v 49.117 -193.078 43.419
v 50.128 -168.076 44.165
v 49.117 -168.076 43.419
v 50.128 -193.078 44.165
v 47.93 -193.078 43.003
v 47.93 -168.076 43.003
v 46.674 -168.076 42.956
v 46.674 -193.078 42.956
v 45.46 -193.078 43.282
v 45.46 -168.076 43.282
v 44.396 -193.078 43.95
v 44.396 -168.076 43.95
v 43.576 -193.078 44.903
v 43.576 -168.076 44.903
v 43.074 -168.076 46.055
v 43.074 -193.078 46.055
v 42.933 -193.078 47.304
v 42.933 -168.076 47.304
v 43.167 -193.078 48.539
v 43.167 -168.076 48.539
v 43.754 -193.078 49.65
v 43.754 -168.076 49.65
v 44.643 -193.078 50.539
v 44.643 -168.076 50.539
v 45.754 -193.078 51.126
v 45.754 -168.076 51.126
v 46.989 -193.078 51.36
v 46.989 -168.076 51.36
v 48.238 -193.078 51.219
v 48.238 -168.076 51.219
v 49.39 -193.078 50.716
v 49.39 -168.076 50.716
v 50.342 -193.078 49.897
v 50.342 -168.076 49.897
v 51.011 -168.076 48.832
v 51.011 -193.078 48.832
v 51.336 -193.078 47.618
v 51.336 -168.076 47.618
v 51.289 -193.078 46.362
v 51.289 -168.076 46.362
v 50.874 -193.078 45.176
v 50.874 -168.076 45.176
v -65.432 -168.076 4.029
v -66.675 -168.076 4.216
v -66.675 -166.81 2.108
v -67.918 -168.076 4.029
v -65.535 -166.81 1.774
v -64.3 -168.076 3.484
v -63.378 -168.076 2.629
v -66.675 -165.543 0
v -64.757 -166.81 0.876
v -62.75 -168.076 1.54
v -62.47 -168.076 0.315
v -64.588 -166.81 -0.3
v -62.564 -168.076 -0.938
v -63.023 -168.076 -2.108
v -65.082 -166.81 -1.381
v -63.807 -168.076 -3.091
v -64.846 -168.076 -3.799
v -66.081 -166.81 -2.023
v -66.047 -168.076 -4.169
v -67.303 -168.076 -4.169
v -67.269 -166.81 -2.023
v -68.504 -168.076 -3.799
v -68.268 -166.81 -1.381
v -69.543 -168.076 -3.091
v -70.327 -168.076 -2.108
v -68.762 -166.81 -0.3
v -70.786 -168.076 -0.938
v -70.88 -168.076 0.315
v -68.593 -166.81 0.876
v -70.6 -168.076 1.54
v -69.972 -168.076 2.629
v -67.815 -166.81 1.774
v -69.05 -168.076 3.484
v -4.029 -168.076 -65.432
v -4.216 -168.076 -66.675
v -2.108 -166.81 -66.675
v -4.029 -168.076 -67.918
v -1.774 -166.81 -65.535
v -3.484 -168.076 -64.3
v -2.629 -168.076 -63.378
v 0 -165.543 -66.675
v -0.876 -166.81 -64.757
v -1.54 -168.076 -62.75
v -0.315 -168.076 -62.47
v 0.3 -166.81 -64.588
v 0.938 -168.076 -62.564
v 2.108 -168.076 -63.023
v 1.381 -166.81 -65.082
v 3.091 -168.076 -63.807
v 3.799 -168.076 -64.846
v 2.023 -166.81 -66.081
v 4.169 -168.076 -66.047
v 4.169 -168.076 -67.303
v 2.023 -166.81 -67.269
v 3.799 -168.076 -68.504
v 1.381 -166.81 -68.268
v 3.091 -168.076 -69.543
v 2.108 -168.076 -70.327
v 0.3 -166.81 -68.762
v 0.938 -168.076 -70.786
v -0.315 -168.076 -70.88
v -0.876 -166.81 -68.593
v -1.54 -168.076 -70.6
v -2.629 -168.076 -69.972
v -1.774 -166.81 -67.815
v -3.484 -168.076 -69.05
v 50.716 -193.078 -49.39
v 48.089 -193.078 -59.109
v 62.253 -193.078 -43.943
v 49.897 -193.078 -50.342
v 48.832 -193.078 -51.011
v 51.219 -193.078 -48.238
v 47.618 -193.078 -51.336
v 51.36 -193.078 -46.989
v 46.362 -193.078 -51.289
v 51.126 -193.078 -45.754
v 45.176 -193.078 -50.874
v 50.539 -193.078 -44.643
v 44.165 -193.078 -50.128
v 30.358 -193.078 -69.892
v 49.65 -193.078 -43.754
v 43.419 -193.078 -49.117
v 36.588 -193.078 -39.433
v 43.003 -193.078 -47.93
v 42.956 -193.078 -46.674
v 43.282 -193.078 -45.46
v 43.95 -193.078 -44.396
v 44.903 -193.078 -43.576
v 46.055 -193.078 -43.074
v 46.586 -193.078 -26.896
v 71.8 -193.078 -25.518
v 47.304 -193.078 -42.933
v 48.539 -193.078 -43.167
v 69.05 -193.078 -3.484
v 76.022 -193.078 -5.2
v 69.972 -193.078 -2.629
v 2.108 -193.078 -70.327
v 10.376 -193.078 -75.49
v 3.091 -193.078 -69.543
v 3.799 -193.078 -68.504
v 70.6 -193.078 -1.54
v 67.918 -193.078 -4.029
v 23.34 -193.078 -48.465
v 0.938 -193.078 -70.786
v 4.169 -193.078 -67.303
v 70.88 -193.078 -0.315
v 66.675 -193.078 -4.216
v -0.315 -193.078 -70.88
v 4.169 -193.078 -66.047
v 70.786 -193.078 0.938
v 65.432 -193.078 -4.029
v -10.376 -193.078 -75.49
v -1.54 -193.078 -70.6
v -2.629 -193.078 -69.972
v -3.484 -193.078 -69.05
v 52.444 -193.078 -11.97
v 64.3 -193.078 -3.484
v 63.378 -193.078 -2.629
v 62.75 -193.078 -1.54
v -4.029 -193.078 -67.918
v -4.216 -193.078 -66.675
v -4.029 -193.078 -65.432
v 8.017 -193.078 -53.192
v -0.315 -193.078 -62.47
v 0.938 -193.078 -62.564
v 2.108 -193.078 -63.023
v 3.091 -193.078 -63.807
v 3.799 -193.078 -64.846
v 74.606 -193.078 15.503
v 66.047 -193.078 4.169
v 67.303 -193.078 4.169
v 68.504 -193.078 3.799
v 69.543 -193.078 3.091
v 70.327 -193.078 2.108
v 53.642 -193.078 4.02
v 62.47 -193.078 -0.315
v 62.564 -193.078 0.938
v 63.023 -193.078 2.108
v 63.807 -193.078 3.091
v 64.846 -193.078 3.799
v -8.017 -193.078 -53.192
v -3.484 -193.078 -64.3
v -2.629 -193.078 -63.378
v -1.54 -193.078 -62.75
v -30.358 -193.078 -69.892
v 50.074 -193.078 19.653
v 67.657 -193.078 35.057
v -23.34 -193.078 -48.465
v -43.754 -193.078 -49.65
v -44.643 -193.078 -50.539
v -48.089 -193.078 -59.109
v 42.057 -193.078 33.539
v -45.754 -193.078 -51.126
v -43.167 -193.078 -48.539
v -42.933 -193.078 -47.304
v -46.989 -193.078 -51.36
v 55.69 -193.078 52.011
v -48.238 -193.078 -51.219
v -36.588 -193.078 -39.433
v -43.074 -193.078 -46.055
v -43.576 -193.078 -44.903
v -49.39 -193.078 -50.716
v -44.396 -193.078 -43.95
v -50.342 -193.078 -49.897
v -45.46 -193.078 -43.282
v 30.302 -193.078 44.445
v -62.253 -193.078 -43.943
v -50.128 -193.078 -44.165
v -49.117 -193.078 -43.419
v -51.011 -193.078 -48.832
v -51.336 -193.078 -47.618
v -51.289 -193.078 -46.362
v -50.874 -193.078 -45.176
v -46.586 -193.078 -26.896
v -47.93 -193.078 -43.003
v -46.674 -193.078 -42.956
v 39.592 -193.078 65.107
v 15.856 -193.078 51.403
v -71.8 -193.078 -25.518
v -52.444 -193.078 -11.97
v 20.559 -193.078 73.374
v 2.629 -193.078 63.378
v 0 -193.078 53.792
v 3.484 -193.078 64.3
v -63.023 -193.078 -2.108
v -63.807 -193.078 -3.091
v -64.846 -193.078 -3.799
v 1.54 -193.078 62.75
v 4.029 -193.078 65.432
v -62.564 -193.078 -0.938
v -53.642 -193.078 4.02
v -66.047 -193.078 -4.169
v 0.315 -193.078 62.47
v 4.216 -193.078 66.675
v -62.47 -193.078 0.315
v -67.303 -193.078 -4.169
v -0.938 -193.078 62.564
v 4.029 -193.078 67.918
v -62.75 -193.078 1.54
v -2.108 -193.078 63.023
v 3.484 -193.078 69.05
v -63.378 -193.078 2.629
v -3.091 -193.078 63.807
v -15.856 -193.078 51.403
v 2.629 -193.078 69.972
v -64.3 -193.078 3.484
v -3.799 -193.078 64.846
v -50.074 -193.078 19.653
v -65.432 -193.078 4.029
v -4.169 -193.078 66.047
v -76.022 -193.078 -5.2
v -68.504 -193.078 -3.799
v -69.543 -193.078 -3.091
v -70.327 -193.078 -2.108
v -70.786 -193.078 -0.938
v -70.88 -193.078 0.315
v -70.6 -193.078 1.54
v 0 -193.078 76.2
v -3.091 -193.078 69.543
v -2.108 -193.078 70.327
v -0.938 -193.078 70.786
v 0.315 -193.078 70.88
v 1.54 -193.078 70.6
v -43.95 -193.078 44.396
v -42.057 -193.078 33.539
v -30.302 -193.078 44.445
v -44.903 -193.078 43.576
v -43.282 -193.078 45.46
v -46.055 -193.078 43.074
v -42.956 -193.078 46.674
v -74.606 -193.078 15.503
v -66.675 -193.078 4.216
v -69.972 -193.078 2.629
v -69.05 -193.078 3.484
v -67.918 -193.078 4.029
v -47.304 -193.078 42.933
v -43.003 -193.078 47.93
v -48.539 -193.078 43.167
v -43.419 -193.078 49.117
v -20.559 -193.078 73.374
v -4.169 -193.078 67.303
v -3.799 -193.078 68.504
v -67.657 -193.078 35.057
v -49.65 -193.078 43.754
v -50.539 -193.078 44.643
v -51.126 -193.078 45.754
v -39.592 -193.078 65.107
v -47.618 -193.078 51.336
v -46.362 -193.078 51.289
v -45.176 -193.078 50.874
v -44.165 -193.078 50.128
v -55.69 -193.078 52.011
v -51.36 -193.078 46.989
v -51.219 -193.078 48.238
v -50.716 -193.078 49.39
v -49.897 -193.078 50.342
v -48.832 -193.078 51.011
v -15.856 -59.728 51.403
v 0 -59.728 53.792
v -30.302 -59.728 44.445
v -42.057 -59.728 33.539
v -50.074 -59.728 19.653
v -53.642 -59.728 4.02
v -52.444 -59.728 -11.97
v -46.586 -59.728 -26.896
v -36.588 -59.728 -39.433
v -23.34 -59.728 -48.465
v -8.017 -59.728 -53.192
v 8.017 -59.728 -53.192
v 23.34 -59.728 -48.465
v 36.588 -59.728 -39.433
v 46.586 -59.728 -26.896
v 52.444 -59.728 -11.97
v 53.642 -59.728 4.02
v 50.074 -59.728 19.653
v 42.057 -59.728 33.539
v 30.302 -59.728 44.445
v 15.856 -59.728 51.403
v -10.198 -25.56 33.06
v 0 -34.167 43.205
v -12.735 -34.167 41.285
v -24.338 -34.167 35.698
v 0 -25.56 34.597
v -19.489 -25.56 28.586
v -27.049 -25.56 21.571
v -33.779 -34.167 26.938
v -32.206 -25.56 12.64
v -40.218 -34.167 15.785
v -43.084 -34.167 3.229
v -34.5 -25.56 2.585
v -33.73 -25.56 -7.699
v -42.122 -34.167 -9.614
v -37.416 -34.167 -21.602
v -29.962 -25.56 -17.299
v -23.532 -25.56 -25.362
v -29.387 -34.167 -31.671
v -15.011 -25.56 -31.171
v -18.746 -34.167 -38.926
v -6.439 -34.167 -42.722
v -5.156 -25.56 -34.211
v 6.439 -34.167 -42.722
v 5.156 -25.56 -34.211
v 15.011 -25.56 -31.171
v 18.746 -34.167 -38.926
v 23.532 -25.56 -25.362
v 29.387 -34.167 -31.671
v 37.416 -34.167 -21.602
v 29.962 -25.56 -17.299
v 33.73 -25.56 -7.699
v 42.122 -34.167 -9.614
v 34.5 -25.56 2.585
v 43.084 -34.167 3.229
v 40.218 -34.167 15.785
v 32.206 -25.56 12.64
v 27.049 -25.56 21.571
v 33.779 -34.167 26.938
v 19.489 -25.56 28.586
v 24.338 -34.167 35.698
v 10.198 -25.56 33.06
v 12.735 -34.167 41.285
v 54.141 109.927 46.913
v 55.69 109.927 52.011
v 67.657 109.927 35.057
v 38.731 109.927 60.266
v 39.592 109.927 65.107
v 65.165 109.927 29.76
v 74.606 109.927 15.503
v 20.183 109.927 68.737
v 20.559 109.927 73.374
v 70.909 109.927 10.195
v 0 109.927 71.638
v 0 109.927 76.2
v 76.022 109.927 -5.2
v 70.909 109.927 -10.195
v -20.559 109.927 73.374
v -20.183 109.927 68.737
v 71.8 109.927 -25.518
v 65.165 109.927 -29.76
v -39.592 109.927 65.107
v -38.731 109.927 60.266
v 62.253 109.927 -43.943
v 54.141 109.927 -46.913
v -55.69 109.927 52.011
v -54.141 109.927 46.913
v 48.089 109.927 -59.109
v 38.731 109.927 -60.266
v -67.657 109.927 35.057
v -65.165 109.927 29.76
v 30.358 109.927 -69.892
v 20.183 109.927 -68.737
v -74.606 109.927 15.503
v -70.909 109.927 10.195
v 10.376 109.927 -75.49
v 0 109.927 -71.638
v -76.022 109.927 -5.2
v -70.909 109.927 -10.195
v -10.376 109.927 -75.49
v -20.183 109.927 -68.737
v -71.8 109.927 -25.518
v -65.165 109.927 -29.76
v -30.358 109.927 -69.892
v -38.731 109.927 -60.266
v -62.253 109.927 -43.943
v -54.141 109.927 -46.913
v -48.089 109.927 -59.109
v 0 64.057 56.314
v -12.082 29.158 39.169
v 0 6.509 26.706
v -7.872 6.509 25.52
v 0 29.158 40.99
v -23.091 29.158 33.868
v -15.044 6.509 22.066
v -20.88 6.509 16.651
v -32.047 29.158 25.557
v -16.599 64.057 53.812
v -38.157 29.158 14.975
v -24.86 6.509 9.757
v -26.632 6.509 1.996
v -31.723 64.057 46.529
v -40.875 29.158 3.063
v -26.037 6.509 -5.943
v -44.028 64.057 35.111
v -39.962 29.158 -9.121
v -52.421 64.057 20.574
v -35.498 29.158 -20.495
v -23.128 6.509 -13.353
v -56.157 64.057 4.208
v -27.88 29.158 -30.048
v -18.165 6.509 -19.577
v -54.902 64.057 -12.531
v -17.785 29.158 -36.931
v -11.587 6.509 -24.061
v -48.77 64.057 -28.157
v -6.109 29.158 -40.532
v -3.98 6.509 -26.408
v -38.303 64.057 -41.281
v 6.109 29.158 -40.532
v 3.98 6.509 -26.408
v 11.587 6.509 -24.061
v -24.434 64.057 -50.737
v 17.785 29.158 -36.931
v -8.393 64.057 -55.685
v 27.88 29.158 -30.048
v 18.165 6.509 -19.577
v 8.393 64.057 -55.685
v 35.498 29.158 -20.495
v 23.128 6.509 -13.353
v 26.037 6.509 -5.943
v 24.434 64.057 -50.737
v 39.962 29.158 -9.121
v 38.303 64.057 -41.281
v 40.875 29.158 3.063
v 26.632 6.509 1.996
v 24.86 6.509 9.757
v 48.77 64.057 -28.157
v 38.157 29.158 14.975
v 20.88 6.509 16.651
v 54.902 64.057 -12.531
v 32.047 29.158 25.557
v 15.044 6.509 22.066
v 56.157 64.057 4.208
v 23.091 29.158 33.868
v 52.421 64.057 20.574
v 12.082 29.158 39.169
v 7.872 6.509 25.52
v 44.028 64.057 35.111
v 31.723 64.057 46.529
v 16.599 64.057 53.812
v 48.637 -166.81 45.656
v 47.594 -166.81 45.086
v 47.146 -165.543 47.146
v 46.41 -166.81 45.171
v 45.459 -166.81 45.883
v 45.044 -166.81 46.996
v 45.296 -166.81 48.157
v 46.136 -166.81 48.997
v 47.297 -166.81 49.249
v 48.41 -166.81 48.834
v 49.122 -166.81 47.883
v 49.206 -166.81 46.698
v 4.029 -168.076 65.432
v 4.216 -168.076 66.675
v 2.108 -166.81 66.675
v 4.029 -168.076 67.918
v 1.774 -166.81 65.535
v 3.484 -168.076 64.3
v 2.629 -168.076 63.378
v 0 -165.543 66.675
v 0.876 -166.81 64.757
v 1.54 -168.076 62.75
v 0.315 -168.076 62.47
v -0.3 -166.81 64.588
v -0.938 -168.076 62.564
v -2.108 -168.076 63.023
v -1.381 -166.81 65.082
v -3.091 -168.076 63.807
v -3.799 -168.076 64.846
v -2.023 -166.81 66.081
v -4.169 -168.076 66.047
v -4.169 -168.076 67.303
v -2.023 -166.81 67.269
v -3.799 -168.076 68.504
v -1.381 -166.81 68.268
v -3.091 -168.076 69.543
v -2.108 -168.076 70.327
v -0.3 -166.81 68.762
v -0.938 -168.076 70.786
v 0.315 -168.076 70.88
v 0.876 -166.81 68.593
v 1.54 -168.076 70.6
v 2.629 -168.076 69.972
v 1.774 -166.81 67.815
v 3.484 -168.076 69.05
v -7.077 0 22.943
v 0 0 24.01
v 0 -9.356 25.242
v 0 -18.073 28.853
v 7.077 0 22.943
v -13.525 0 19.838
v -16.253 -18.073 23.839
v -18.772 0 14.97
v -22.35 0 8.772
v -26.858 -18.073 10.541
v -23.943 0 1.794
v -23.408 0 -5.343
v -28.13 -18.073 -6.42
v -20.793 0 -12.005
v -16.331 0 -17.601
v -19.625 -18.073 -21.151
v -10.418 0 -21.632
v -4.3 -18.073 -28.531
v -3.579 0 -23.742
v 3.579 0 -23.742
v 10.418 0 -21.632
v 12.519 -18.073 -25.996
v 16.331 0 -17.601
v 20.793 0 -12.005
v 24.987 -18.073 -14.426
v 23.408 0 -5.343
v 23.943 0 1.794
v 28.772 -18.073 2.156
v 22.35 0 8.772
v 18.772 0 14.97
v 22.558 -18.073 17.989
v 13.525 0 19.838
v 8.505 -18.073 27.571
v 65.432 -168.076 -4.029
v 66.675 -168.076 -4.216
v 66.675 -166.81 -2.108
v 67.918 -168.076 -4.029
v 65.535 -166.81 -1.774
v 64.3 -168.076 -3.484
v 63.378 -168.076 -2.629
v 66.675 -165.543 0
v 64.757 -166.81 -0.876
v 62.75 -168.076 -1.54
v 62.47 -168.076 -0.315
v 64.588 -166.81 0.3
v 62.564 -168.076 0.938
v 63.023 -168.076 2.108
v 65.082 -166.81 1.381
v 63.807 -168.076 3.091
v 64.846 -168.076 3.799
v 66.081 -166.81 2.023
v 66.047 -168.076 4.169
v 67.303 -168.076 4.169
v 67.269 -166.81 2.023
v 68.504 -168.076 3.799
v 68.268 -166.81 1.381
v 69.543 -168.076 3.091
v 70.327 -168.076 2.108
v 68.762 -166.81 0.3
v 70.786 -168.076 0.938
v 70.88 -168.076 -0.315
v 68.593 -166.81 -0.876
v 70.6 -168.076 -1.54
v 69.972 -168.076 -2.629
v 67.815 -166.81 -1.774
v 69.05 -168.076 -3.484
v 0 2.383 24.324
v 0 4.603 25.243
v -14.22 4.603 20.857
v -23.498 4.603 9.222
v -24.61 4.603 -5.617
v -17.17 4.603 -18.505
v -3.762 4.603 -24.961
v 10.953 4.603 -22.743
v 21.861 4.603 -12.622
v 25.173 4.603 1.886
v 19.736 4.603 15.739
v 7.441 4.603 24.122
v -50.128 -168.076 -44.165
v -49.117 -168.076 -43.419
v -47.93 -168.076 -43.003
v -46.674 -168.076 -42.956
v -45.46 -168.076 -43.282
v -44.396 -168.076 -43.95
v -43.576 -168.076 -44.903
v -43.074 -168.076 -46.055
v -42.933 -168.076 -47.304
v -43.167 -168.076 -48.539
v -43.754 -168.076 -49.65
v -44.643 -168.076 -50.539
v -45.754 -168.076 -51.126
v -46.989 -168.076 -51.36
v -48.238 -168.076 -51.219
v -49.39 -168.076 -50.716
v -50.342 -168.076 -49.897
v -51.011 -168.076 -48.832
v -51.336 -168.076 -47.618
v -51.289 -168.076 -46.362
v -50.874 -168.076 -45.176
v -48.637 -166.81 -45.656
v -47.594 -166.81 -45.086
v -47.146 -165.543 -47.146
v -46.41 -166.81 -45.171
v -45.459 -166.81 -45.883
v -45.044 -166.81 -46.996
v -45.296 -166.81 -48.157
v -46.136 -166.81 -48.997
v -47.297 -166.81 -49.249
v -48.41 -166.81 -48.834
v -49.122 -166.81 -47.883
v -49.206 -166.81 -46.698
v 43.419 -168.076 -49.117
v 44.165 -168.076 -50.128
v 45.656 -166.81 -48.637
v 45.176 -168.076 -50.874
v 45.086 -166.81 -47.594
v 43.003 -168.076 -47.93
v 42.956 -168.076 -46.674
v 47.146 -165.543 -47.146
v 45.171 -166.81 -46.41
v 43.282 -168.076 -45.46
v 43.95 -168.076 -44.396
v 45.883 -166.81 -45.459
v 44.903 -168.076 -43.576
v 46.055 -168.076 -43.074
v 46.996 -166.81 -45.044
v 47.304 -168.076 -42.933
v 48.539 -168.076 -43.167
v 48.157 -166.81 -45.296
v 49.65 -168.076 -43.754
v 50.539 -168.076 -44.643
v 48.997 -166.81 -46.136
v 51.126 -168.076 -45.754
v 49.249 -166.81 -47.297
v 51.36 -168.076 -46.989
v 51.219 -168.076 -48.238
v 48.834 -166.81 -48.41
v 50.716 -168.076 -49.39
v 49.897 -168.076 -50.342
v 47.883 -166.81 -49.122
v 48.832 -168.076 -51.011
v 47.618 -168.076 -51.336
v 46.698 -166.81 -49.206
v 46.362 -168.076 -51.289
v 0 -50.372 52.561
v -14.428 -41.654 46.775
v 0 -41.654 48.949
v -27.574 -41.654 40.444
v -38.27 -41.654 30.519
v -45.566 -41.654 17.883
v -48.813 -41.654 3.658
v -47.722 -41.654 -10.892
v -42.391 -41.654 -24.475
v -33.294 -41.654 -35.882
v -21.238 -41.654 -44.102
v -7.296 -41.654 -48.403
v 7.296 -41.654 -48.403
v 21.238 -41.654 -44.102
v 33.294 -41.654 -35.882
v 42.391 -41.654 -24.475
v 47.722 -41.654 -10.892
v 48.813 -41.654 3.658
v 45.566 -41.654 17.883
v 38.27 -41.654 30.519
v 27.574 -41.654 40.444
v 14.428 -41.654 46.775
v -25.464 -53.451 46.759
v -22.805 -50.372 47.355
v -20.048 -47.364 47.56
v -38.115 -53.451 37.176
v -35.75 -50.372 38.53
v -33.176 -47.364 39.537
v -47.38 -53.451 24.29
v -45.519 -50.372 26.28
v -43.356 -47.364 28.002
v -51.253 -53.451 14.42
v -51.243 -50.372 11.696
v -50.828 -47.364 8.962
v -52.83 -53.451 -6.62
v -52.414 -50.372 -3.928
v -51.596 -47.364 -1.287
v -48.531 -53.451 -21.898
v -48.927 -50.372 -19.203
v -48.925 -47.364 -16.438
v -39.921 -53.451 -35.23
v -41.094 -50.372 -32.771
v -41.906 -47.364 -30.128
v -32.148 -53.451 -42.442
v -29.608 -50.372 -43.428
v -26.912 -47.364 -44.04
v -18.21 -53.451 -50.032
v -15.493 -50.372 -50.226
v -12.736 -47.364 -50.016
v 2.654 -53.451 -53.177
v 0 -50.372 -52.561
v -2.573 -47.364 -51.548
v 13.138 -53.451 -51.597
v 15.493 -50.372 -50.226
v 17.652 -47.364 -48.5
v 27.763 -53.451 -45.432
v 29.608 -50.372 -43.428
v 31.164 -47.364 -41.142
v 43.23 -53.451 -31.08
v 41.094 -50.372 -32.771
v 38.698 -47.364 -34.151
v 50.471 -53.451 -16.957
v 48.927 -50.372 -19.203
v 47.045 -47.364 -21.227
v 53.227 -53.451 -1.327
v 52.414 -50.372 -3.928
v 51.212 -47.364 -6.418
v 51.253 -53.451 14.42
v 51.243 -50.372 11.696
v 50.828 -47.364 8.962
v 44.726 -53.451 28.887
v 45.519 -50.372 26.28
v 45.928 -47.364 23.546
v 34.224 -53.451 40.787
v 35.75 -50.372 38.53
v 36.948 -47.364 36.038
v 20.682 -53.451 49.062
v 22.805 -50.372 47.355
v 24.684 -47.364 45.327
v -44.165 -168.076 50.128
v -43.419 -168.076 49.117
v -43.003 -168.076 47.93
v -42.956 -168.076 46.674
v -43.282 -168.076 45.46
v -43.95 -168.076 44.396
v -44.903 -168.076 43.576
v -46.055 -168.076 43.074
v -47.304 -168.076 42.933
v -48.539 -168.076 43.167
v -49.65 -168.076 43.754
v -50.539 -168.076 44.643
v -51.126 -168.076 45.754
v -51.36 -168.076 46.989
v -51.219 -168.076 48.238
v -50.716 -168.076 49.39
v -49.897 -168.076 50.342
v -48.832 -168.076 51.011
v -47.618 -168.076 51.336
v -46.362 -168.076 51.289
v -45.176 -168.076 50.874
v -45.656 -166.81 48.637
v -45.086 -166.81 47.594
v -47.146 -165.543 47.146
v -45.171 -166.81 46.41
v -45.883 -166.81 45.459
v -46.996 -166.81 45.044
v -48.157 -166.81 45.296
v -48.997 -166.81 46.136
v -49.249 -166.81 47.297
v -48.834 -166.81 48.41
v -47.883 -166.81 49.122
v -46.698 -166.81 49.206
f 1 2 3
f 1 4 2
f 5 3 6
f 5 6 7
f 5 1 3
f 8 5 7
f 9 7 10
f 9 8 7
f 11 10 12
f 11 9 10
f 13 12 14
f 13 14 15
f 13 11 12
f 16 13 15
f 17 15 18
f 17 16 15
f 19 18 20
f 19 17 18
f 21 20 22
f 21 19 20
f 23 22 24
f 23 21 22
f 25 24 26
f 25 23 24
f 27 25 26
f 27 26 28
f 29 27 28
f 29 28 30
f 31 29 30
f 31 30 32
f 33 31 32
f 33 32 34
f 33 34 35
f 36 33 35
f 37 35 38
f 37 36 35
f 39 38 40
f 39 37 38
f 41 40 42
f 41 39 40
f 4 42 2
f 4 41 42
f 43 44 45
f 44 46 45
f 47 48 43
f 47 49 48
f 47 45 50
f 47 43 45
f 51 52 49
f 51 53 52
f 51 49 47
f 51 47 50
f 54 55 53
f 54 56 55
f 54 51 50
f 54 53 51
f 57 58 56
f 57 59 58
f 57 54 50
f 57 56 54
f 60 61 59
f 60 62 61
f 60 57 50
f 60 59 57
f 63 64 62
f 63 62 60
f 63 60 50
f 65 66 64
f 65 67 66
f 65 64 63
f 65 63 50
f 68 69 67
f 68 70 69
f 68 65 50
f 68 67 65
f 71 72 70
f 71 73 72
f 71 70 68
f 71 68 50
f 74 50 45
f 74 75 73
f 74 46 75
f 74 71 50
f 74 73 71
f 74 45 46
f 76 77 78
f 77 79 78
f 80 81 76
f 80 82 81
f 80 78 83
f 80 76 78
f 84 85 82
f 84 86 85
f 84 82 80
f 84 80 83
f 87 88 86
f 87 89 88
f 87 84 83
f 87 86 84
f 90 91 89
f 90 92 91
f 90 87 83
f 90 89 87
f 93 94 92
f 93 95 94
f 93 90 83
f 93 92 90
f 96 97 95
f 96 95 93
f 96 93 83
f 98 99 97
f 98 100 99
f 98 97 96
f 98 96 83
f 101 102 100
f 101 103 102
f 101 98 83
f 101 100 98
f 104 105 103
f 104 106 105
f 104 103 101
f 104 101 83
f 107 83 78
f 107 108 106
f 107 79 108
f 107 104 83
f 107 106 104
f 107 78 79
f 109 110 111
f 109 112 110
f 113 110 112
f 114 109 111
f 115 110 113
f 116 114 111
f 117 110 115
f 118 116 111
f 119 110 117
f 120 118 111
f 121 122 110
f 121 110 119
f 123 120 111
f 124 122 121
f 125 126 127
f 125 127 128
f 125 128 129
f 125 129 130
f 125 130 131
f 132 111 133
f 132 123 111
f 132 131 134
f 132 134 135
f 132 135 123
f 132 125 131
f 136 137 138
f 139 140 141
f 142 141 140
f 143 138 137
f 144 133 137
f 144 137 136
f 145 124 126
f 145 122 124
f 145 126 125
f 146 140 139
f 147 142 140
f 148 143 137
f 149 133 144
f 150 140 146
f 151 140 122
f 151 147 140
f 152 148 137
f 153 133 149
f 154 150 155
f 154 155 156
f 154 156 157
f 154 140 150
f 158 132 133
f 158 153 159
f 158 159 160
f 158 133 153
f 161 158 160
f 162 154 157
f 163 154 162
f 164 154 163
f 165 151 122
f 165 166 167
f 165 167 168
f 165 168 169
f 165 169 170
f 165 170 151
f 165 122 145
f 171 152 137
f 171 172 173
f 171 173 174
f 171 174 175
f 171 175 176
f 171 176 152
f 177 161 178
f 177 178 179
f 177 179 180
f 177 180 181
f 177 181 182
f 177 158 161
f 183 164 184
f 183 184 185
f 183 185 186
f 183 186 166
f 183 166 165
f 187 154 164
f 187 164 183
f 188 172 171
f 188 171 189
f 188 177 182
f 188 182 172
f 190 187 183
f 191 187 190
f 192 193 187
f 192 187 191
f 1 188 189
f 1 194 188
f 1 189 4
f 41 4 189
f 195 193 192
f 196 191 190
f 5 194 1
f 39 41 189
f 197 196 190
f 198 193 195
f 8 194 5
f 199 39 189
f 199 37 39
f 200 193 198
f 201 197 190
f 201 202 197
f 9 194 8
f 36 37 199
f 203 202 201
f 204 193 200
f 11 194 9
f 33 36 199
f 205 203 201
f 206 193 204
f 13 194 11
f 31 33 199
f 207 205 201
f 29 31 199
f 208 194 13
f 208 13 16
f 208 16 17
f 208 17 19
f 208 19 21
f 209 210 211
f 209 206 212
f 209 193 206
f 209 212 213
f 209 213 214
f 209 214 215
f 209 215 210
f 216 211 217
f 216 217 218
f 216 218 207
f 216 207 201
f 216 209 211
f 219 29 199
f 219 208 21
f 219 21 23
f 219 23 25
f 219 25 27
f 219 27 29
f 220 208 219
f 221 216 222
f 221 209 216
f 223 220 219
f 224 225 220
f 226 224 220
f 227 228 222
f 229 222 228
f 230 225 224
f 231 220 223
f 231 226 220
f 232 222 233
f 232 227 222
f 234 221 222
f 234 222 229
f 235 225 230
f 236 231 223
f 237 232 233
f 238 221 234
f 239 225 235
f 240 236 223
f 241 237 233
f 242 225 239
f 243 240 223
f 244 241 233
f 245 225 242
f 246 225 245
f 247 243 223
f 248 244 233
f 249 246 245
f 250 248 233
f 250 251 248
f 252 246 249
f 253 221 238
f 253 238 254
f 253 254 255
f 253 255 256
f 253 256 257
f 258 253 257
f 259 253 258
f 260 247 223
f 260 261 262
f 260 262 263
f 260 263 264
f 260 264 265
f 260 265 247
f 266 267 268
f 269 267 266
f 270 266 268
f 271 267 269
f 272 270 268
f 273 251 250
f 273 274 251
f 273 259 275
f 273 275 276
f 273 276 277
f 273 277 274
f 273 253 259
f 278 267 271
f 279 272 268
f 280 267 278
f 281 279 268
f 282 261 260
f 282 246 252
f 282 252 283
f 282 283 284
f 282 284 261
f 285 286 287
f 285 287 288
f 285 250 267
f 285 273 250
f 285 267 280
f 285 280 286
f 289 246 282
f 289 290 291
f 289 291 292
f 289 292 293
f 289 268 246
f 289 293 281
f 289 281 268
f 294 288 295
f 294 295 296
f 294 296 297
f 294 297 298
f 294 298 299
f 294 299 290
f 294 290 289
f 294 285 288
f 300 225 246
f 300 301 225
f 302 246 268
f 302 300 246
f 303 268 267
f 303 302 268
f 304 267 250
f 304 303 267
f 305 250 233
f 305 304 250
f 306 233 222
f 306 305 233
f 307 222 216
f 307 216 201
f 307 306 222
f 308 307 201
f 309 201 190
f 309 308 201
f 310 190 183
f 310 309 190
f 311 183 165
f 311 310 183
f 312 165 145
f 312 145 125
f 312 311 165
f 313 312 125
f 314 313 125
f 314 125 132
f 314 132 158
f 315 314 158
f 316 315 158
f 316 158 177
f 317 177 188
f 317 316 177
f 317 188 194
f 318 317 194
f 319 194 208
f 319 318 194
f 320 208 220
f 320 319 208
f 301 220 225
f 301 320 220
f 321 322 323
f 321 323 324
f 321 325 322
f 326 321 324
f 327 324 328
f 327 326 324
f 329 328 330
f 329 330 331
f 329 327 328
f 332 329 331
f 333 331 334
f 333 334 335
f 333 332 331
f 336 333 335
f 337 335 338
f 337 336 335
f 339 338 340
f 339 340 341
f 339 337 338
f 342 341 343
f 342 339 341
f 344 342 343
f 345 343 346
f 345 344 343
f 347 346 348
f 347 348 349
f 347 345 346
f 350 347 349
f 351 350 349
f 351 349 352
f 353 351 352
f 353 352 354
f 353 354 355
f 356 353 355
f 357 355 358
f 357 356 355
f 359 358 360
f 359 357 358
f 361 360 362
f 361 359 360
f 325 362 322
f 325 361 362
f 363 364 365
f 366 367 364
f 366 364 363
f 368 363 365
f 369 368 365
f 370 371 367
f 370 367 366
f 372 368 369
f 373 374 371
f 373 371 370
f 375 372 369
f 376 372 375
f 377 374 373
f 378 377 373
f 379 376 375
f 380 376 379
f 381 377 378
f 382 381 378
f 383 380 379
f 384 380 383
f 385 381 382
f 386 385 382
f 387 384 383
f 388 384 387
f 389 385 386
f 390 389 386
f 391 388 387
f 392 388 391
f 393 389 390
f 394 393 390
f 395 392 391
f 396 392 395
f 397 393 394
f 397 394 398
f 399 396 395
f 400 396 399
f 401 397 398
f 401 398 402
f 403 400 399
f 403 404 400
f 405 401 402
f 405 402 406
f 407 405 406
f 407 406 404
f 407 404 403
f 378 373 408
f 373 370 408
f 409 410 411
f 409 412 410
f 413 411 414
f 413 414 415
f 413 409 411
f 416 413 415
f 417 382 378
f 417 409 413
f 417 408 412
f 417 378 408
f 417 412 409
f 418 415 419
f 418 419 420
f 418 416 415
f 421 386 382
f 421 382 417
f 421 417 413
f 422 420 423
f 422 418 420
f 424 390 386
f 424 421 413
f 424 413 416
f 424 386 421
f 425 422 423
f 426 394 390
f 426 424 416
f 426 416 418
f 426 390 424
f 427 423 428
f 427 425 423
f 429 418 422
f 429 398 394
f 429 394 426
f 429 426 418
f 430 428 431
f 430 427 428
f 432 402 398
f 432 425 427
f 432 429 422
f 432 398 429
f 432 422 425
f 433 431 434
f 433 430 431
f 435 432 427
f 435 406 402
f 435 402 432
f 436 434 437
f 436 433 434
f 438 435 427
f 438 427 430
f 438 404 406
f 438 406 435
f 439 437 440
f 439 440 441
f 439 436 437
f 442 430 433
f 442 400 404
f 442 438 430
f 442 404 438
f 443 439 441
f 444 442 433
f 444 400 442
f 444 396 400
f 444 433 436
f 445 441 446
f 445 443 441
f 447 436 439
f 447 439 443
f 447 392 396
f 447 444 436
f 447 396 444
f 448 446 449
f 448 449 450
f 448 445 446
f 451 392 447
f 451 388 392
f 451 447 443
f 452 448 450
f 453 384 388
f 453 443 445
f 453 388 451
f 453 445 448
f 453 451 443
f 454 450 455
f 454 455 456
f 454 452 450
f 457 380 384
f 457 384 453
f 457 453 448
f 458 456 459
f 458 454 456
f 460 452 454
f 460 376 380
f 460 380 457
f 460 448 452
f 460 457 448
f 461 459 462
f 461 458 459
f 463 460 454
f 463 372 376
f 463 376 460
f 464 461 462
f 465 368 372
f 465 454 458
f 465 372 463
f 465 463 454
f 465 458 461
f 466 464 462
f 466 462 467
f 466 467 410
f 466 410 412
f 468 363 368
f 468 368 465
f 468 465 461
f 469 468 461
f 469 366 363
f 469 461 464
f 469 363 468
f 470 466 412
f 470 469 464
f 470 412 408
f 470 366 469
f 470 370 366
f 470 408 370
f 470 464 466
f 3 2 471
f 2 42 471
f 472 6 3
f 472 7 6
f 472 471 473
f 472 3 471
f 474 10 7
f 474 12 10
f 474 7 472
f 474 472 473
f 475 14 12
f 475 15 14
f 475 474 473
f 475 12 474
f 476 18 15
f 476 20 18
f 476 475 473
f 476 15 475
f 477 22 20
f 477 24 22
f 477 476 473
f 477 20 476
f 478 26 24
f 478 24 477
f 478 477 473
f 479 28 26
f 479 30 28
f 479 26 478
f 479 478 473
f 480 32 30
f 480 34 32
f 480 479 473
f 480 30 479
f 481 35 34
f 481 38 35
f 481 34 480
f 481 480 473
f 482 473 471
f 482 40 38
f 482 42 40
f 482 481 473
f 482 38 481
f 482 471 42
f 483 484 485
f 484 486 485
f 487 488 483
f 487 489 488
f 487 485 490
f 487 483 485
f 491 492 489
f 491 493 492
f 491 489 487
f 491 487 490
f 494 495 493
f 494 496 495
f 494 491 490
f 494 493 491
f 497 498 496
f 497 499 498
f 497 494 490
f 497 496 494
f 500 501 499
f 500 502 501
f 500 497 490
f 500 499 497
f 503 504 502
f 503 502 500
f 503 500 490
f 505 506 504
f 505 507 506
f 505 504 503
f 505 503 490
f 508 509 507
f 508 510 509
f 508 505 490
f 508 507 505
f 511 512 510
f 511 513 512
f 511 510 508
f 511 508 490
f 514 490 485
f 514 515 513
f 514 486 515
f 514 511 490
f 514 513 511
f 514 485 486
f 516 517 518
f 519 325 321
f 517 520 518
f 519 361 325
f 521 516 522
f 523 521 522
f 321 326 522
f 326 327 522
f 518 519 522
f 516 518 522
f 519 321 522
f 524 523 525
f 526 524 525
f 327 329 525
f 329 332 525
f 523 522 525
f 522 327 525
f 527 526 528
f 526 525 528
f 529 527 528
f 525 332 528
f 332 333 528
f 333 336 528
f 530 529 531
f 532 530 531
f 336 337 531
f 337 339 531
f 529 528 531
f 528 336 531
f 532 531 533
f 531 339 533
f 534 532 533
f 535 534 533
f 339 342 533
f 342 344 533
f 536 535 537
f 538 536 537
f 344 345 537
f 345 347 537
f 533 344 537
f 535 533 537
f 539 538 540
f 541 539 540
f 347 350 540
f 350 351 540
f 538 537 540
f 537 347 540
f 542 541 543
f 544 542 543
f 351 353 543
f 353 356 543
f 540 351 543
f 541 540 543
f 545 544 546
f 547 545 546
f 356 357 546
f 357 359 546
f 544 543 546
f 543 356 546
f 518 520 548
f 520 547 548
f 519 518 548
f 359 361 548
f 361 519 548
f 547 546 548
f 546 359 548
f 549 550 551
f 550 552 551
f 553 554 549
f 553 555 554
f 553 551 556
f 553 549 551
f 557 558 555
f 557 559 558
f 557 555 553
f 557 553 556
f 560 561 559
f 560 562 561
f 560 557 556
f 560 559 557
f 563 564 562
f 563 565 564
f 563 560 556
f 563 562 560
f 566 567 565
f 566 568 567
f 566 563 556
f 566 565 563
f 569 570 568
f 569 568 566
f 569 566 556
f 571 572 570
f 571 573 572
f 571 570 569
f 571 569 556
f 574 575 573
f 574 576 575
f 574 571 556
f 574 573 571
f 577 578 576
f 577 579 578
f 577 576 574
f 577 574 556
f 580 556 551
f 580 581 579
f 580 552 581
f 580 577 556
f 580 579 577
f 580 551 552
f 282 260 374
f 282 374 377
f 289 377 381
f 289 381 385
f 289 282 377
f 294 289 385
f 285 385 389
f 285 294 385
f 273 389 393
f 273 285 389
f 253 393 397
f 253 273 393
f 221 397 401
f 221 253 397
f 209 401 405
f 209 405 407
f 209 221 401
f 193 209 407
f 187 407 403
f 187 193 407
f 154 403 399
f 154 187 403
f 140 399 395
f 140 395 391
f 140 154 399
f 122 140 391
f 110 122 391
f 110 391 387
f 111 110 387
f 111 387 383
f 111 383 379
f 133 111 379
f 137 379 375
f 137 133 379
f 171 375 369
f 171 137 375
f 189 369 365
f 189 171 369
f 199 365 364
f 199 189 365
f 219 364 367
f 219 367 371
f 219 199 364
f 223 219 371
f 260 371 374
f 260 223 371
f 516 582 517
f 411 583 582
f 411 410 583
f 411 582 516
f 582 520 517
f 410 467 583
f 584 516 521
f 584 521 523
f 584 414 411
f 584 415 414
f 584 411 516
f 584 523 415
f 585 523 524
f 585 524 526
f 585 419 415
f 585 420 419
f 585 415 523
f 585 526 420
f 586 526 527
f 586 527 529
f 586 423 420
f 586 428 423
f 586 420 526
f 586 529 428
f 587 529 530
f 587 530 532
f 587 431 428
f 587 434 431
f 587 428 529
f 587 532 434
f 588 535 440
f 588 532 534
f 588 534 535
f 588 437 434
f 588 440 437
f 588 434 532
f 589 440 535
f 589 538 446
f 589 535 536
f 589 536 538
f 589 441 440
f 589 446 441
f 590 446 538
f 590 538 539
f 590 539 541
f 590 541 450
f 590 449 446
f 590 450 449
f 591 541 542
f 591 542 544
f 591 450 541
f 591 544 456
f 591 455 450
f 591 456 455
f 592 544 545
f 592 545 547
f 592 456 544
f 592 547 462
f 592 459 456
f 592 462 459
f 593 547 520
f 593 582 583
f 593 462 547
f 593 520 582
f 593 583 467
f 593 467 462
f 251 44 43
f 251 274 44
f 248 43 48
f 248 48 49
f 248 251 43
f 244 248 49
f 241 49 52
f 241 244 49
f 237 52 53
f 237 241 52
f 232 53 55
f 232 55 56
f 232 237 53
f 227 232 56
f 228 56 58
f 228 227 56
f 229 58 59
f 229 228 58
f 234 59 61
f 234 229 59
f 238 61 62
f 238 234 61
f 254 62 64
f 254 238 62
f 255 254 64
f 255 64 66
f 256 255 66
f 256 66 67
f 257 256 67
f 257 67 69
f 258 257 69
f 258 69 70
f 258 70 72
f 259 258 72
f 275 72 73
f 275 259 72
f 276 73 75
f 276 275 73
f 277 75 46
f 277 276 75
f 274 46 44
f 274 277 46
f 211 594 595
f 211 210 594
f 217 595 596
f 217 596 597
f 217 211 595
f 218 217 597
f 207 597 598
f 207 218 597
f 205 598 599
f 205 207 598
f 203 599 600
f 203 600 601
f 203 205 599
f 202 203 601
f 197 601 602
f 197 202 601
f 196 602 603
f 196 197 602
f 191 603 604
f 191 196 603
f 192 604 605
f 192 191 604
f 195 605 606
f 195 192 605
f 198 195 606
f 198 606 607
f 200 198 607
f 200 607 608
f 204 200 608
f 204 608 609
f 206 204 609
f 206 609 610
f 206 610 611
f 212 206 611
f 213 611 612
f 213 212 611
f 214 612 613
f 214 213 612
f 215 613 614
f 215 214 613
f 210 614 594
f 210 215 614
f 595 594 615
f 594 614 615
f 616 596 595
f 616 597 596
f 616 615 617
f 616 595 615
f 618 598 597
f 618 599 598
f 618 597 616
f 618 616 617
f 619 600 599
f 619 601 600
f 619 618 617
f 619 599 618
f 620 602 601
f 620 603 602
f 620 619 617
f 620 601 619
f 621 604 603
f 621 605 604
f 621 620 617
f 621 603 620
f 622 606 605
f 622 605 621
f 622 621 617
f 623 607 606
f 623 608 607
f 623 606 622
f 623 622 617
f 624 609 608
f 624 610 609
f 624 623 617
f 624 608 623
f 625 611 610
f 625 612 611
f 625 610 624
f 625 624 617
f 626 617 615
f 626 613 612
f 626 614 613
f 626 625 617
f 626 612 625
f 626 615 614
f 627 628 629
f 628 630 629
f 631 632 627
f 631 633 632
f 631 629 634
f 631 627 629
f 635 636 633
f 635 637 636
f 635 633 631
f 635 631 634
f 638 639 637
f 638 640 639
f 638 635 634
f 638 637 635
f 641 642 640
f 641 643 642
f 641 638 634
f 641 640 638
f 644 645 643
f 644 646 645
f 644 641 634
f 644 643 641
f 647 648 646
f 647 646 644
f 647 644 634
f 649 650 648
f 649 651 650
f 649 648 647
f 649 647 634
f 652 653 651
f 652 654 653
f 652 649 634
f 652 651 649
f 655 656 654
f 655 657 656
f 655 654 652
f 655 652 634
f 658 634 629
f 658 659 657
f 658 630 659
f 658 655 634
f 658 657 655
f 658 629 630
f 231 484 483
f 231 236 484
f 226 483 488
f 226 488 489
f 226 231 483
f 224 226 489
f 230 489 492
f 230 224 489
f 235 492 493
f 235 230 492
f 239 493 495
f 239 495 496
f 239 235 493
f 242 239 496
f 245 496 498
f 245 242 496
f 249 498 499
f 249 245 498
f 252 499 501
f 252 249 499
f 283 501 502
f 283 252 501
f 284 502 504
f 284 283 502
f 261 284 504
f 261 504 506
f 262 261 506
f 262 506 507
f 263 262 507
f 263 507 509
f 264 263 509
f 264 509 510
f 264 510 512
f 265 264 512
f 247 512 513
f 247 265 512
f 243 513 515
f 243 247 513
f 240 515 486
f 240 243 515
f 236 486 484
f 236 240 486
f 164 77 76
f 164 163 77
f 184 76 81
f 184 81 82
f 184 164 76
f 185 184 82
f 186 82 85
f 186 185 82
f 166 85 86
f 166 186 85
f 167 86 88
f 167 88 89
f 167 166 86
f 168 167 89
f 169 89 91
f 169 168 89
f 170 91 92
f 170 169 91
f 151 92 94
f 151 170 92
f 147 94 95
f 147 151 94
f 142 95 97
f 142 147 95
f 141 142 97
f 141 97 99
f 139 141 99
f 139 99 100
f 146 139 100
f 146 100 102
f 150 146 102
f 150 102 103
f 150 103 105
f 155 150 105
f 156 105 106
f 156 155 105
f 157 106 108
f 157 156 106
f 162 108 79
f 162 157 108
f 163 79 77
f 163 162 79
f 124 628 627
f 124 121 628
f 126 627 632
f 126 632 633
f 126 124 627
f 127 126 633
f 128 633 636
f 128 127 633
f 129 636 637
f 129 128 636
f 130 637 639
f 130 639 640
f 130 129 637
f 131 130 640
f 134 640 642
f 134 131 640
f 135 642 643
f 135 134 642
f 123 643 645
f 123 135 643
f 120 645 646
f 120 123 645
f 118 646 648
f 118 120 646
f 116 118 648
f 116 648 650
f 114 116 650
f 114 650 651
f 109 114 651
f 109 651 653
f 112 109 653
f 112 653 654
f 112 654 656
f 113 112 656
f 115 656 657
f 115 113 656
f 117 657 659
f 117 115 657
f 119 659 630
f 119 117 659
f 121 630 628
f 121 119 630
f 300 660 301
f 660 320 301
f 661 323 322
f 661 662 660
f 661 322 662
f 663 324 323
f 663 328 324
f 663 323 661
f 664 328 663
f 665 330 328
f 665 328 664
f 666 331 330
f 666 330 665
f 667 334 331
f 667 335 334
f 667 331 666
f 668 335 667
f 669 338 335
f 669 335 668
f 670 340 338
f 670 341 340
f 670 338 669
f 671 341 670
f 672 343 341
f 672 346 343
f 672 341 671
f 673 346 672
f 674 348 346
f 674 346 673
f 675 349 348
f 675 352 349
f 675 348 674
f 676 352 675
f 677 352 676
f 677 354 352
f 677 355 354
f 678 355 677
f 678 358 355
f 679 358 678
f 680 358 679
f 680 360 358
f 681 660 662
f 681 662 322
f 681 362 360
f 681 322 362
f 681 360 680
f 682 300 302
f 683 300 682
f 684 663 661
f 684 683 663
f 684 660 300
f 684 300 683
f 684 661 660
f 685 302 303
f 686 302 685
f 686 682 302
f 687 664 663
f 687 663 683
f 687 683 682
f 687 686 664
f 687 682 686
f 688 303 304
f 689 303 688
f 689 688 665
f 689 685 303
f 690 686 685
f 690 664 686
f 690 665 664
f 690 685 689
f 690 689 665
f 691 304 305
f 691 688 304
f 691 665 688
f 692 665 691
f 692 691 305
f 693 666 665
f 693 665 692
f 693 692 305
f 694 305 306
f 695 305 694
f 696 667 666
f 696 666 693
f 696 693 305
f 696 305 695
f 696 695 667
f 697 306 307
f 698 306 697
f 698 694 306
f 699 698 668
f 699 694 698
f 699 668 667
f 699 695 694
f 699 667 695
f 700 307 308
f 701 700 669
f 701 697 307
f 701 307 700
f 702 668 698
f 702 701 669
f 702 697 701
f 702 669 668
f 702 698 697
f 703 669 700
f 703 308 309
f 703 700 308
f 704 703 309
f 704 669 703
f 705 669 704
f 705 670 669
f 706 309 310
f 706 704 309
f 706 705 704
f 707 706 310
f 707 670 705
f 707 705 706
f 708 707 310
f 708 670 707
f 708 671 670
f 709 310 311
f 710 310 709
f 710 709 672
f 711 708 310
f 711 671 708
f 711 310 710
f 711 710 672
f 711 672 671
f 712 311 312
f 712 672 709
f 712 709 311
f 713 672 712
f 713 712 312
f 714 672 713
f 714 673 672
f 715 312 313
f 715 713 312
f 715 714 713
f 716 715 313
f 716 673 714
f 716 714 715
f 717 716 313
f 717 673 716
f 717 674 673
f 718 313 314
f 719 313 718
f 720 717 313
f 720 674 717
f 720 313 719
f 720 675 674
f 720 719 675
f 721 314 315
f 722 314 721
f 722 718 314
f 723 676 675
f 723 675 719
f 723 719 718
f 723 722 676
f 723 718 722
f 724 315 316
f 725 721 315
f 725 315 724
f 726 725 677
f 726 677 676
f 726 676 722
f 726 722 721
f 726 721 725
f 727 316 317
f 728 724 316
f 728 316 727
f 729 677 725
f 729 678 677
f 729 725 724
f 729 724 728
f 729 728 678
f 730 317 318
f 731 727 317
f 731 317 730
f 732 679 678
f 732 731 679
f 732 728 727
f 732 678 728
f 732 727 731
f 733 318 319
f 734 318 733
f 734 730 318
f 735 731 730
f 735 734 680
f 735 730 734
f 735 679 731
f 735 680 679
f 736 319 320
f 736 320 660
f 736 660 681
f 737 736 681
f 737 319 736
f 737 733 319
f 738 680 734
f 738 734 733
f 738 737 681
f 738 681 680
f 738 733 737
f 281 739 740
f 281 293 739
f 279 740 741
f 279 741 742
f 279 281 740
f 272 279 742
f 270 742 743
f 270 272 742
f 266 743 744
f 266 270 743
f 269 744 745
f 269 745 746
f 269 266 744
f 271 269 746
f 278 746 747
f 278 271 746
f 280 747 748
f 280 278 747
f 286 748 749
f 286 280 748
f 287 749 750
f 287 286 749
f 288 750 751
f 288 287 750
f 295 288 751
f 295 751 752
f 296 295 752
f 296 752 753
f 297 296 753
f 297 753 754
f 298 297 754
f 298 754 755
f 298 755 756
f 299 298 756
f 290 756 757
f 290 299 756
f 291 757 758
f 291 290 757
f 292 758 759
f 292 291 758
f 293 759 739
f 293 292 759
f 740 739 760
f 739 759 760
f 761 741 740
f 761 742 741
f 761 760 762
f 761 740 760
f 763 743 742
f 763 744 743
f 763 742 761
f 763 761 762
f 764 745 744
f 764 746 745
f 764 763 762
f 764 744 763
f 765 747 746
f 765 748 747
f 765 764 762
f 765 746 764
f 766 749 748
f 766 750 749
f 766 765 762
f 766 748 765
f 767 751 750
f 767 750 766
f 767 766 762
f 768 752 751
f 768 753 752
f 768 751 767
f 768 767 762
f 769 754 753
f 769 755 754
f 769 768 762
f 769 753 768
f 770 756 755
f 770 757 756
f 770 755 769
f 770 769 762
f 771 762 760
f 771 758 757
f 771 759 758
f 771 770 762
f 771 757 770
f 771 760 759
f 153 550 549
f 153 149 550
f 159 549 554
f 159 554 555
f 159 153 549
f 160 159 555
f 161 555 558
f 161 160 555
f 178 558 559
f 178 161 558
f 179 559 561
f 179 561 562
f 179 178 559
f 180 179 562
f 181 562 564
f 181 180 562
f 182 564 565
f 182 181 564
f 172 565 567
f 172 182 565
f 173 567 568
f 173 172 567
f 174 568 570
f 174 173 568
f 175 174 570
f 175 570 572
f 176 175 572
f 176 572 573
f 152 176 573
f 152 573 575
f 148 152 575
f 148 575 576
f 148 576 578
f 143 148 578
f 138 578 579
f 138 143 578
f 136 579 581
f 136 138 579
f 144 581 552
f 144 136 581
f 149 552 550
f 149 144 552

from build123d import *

# Parameters (mm, degrees)
SHORTEN_CHAMBER_75IN_BY = 19.05
CIRPATTERN1_COUNT       = 8


with BuildPart() as part:
    # Sketch1 → Revolve2 (revolve)
    with BuildSketch(Plane.XY, mode=Mode.PRIVATE) as revolve2_sk:
        with BuildLine():
            Line((71.638455479, 109.927347077), (76.2, 109.927347077))
            Line((76.2, 109.927347077), (76.2, -212.127673725))
            Line((76.2, -212.127673725), (53.792460196, -212.127673725))
            Line((53.792460196, -212.127673725), (53.792460196, -59.727673725))
            add(Edge.make_bspline(
                [(53.792460196, -59.727673725), (53.792458964, -59.657143655), (53.791929819, -59.515566601), (53.789553965, -59.181725115), (53.783229362, -58.904955991), (53.77374387, -58.532727986), (53.761100968, -58.21299812), (53.741350135, -57.781754942), (53.711337787, -57.281120398), (53.667125616, -56.688158665), (53.588220936, -55.848640867), (53.488359334, -55.008326363), (53.367608248, -54.172595934), (53.197743271, -53.172585746), (53.002996623, -52.17760333), (52.777307543, -51.188699595), (52.520946634, -50.207649553), (52.240221737, -49.233238259), (51.935281123, -48.266129746), (51.5444702, -47.149295595), (51.050452714, -45.89056894), (50.509666089, -44.651129345), (49.922993248, -43.432862075), (49.291052535, -42.237253796), (48.615057518, -41.066315445), (47.895407794, -39.921133233), (47.134034398, -38.804236825), (46.430801308, -37.85161238), (45.804470174, -37.055832726), (45.263749909, -36.403541893), (44.82605917, -35.894408249), (44.425708405, -35.447153279), (44.092389714, -35.084791811), (43.784856831, -34.760500781), (43.58500461, -34.551710083), (43.355324273, -34.318676923), (43.254715351, -34.217322692), (43.204843203, -34.167450306)],
                knots=[0.082637729, 0.082637729, 0.082637729, 0.082637729, 0.082637729, 0.092574926, 0.102512123, 0.11244932, 0.122386517, 0.132323714, 0.142260911, 0.162135305, 0.182009699, 0.201884093, 0.24163288, 0.261507274, 0.281381668, 0.321130456, 0.360879243, 0.380753637, 0.400628031, 0.440376819, 0.480125606, 0.519874394, 0.559623181, 0.599371969, 0.639120757, 0.678869544, 0.718618332, 0.75836712, 0.798115907, 0.817990301, 0.837864695, 0.857739089, 0.877613483, 0.88755068, 0.897487877, 0.907425074, 0.91736227, 0.91736227, 0.91736227, 0.91736227, 0.91736227], degree=4))
            Line((43.204843203, -34.167450306), (34.597215006, -25.55982211))
            add(Edge.make_bspline(
                [(24.01, 0), (24.010001231, -0.070528647), (24.010530378, -0.21358419), (24.012906064, -0.543182916), (24.019230459, -0.824160397), (24.028715581, -1.194822072), (24.041357875, -1.513435058), (24.0571581, -1.861939603), (24.076113359, -2.193706872), (24.103750974, -2.6180694), (24.143219182, -3.122033947), (24.214231845, -3.879978675), (24.334058818, -4.886450388), (24.510418188, -6.05671076), (24.761817381, -7.385166414), (25.062727465, -8.703574514), (25.412702779, -10.009637208), (25.811293143, -11.301819595), (26.257877555, -12.578099333), (26.75193549, -13.836887482), (27.292605293, -15.076197126), (27.879411561, -16.294609791), (28.511071576, -17.489938791), (29.187464578, -18.661287753), (29.906377287, -19.805743392), (30.668954188, -20.92386007), (31.370099384, -21.874411755), (31.999668317, -22.673445475), (32.535060612, -23.320422132), (32.983187966, -23.84000501), (33.419382225, -24.32981624), (33.846758322, -24.788484383), (34.156490841, -25.113868303), (34.44779216, -25.409649039), (34.547344628, -25.509949925), (34.597215006, -25.55982211)],
                knots=[0.082637729, 0.082637729, 0.082637729, 0.082637729, 0.082637729, 0.092574926, 0.102512123, 0.11244932, 0.122386517, 0.132323714, 0.142260911, 0.152198108, 0.162135305, 0.182009699, 0.201884093, 0.24163288, 0.281381668, 0.321130456, 0.360879243, 0.400628031, 0.440376819, 0.480125606, 0.519874394, 0.559623181, 0.599371969, 0.639120757, 0.678869544, 0.718618332, 0.75836712, 0.798115907, 0.817990301, 0.837864695, 0.857739089, 0.877613483, 0.897487877, 0.907425074, 0.91736227, 0.91736227, 0.91736227, 0.91736227, 0.91736227], degree=4))
            add(Edge.make_bspline(
                [(24.01, 0), (24.010000626, 0.035892652), (24.010538457, 0.11011369), (24.012955849, 0.267641069), (24.019393694, 0.427064117), (24.031465725, 0.646764266), (24.052367213, 0.901433328), (24.086116845, 1.202537273), (24.137431431, 1.542050498), (24.201475827, 1.880996777), (24.278073727, 2.21635442), (24.367255697, 2.549239421), (24.468673539, 2.878092645), (24.582551197, 3.203347041), (24.708128897, 3.523627157), (24.846218103, 3.839666733), (24.995002427, 4.149282184), (25.156944348, 4.454783123), (25.327420631, 4.751301575), (25.513446847, 5.045703861), (25.702720396, 5.325518936), (25.9153376, 5.610727543), (26.0898085, 5.832913647), (26.277277882, 6.049951637), (26.415487374, 6.208641646), (26.581374196, 6.382121779), (26.655452387, 6.458478841), (26.706211329, 6.50923965)],
                knots=[0.082568816, 0.082568816, 0.082568816, 0.082568816, 0.082568816, 0.102426634, 0.122284453, 0.142142271, 0.162000089, 0.201715725, 0.241431362, 0.281146998, 0.320862634, 0.360578271, 0.400293907, 0.440009544, 0.47972518, 0.519440816, 0.559156453, 0.598872089, 0.638587725, 0.678303362, 0.718018998, 0.757734635, 0.797450271, 0.837165907, 0.857023726, 0.876881544, 0.91659718, 0.91659718, 0.91659718, 0.91659718, 0.91659718], degree=4))
            add(Edge.make_bspline(
                [(26.706211329, 6.50923965), (49.172333461, 34.635954224), (71.638455479, 109.927347077)],
                knots=[0, 0, 0, 1, 1, 1], degree=2))
        make_face()
    revolve(revolve2_sk.sketch.rotate(Axis((0, 0, 0), (0, -1, 0)), 90), axis=Axis((0, 0, 0), (0, -1, 0)))

    # shorten_chamber_.75in: a face moved inward by 19.05
    extrude(part.faces().sort_by_distance((60.96, -212.127673725, 0))[0], amount=SHORTEN_CHAMBER_75IN_BY, dir=(0, 1, 0), mode=Mode.SUBTRACT)

    # Sketch4 → 3/8-24 Tapped Hole1 (revolve, cut)
    with BuildSketch(Plane(origin=(66.675, -193.077673725, 0), x_dir=(0, 0, -1), z_dir=(1, 0, 0))):
        Polygon((0, 0), (0, 27.534688714), (4.2164, 25.00122), (4.2164, 0), align=None)
    f_3_8_24_tapped_hole1 = revolve(axis=Axis((66.675, -199.427673725, 0), (0, 1, 0)), mode=Mode.SUBTRACT)

    # CirPattern1: 3/8-24 Tapped Hole1 ×8 about axis
    cirpattern1_axis = Axis((0, 0, 0), (0, 1, 0))
    for i in range(1, CIRPATTERN1_COUNT):
        add(f_3_8_24_tapped_hole1.rotate(cirpattern1_axis, i * 360 / CIRPATTERN1_COUNT), mode=Mode.SUBTRACT)


solid = part.part
